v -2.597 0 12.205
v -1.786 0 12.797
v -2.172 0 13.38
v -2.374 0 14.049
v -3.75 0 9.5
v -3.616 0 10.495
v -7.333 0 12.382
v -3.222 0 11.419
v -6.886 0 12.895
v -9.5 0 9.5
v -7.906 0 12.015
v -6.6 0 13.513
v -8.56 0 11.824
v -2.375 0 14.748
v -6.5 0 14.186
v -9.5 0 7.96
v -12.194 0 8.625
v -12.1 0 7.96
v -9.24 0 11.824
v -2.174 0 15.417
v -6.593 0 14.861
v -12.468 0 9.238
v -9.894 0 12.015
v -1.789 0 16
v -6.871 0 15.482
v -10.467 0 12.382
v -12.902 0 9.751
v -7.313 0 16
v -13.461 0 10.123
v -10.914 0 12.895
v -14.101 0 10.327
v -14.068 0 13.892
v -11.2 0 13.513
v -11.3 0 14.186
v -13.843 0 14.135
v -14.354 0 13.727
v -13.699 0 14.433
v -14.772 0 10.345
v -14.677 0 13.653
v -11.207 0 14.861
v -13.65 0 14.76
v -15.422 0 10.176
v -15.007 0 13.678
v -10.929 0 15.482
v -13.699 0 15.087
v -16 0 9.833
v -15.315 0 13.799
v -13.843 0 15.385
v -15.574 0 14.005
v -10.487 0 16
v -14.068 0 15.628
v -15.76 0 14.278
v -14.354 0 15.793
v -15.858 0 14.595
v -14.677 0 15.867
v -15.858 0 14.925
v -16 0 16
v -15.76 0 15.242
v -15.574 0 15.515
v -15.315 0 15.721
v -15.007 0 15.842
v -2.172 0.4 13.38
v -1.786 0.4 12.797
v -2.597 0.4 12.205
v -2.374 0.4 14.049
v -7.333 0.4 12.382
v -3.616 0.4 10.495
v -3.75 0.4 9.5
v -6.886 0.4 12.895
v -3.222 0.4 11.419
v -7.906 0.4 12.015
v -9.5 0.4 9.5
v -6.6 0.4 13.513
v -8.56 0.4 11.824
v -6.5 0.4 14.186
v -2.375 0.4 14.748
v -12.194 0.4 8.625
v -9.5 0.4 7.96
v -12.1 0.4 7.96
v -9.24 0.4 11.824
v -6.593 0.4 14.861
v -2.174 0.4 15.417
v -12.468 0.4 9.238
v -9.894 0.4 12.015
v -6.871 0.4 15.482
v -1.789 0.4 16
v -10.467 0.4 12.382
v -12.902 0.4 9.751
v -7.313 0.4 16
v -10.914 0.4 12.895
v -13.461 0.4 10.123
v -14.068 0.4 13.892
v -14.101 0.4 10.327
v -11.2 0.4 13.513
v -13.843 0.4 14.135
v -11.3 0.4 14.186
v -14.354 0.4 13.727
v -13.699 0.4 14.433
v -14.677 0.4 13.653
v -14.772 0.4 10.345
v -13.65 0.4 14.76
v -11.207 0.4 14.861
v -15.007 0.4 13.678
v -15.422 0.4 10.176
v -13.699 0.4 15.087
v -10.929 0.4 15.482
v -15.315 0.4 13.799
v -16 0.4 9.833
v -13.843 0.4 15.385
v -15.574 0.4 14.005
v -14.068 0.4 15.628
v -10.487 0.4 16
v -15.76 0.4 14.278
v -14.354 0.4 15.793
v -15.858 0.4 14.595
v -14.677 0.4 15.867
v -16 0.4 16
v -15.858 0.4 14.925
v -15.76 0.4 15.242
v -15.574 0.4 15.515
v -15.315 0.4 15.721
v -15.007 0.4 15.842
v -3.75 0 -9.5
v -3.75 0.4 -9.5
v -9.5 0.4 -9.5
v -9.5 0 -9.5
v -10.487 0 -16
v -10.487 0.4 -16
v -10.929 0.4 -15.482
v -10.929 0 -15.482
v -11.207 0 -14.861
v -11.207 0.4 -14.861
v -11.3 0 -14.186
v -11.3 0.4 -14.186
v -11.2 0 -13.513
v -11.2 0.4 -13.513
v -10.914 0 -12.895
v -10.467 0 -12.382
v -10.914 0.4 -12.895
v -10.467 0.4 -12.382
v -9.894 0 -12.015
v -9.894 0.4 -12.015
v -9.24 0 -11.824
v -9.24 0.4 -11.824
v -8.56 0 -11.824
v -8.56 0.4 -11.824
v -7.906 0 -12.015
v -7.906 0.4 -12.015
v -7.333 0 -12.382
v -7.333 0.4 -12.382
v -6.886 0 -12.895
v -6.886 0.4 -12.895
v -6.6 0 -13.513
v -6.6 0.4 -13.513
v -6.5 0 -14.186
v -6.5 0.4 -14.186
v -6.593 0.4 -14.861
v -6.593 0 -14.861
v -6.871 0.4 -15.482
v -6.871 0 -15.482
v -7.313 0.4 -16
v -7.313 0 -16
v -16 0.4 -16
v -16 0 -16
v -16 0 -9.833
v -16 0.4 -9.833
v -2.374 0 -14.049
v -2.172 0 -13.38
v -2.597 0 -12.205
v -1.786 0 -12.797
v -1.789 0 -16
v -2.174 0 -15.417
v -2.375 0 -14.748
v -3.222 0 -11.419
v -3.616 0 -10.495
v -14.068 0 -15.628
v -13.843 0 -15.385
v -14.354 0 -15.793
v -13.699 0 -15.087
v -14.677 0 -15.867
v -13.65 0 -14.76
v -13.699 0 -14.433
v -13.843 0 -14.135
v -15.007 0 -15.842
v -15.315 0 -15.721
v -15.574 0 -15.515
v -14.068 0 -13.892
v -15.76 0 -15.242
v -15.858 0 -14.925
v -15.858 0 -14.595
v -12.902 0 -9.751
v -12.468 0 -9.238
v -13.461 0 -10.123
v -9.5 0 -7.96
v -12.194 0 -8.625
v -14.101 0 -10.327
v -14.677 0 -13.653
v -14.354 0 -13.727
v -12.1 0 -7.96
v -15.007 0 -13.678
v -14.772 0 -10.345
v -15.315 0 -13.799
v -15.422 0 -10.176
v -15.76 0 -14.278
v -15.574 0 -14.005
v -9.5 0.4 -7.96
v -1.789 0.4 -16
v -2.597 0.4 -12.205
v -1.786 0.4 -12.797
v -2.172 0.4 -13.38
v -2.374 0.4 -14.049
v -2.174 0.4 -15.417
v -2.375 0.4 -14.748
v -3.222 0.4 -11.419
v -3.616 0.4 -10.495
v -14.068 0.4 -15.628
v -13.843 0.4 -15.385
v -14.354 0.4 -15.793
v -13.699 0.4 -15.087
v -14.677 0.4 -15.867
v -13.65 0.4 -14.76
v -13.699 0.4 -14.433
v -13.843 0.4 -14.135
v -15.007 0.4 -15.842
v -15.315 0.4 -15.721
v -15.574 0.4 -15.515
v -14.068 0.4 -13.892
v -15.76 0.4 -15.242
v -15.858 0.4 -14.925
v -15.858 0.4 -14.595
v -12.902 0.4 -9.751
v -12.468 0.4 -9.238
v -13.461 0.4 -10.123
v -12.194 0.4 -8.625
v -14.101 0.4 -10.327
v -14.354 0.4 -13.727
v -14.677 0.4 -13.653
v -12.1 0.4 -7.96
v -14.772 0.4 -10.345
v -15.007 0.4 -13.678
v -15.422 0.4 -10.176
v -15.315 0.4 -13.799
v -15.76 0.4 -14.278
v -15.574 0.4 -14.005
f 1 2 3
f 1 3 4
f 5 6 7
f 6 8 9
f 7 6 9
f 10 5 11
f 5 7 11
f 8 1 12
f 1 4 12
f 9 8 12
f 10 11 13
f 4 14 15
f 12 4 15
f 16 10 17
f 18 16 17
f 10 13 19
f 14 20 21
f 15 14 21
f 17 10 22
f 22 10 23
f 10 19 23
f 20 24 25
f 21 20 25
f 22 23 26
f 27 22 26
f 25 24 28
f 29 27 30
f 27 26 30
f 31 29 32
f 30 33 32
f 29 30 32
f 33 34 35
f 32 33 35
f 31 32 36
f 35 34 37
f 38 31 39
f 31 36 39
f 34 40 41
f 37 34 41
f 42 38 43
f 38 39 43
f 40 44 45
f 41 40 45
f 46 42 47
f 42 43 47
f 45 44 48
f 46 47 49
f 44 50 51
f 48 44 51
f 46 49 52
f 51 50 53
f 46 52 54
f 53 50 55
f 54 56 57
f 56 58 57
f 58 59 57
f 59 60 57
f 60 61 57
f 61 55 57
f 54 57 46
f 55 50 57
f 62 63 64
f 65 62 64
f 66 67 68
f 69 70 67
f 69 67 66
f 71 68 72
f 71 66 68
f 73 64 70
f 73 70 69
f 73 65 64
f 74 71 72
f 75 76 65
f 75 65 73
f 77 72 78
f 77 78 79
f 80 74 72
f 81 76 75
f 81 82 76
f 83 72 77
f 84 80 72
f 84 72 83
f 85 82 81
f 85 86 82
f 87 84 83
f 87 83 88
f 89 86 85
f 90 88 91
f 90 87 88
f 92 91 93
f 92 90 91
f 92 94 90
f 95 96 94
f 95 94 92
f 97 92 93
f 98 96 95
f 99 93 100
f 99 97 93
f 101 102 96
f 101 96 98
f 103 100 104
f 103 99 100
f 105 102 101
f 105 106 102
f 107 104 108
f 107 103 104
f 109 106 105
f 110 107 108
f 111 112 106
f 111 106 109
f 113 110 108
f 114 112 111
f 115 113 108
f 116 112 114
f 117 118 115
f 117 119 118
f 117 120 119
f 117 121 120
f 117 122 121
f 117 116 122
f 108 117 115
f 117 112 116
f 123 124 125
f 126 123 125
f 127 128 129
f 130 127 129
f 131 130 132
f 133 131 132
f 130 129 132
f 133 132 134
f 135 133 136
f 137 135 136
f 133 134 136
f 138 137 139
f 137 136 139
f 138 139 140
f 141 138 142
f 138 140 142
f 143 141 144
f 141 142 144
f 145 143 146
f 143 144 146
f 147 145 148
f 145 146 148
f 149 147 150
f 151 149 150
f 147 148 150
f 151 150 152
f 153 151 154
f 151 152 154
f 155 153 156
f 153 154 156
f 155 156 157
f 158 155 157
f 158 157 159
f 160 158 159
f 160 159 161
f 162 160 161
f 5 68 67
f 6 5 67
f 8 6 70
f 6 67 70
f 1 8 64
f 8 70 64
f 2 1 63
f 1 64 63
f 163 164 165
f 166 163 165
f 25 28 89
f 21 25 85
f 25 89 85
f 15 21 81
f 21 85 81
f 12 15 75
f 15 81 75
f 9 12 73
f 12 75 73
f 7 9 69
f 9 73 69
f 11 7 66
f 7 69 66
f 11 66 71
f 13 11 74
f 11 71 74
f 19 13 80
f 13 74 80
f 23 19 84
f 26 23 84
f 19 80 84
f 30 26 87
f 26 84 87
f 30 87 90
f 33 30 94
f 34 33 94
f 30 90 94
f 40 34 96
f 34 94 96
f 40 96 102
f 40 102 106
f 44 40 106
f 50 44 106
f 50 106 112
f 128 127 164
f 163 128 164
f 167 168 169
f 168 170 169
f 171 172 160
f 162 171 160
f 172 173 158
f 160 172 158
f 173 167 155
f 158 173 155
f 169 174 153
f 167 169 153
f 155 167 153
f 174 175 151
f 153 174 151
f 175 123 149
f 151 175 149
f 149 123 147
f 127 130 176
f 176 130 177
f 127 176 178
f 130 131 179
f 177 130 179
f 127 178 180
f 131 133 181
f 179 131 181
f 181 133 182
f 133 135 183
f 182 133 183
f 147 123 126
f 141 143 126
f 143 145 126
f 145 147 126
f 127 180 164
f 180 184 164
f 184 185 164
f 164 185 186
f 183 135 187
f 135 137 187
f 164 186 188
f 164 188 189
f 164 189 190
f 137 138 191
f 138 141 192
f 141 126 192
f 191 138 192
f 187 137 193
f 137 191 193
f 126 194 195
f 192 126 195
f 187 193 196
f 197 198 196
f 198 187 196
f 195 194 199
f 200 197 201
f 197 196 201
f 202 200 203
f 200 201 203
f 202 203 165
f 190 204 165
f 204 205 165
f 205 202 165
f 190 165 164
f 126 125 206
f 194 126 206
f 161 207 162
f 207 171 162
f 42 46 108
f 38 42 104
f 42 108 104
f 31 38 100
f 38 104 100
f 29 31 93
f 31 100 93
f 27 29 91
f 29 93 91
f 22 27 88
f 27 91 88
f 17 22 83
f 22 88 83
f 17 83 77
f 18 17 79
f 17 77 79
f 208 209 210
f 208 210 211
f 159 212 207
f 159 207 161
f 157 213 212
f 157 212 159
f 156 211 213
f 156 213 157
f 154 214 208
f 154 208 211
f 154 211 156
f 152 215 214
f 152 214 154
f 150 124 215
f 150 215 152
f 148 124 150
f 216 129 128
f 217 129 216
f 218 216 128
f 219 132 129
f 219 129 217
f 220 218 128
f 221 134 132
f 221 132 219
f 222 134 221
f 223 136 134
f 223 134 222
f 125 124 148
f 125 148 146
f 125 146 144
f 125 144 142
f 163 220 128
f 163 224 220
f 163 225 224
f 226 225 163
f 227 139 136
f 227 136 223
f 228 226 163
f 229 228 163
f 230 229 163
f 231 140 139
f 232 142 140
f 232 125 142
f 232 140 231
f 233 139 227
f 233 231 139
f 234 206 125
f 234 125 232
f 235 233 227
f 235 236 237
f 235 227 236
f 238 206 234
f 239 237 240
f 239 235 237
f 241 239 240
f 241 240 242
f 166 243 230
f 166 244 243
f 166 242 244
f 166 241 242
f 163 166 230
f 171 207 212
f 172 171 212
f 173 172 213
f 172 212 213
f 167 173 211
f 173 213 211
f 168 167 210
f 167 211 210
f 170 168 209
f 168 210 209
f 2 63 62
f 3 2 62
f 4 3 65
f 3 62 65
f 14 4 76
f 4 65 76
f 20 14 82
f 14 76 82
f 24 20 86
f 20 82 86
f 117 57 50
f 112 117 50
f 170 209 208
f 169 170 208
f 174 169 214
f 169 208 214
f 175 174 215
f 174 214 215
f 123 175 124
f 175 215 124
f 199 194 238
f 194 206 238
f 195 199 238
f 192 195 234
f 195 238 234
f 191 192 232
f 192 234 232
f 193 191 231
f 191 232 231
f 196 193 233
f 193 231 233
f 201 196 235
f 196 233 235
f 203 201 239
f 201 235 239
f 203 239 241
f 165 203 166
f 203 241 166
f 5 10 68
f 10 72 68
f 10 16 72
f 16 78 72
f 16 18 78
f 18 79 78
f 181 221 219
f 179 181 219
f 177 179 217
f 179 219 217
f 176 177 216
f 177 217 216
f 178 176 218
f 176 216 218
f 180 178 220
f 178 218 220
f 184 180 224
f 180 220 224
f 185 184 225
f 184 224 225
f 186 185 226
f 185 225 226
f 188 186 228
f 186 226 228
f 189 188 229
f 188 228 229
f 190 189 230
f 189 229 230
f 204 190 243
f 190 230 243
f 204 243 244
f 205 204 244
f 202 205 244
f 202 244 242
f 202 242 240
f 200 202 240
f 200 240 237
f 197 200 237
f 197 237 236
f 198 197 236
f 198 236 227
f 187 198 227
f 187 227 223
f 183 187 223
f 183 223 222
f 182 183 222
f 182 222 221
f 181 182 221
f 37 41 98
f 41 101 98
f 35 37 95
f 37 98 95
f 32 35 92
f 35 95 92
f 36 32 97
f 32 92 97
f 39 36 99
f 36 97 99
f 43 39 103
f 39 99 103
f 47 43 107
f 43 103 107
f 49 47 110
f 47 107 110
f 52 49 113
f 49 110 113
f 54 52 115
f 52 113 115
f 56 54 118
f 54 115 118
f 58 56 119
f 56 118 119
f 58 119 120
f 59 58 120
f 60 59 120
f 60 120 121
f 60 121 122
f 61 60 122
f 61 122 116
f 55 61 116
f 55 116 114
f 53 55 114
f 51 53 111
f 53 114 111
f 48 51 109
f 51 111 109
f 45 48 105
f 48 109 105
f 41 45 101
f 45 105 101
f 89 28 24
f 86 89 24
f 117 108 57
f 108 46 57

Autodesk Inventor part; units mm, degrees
ref_plane "YZ Plane" through (0, 0, 0) normal (1, 0, 0) x (0, 1, 0)
ref_plane "XZ Plane" through (0, 0, 0) normal (0, 1, 0) x (-1, 0, 0)
ref_plane "XY Plane" through (0, 0, 0) normal (0, 0, 1) x (1, 0, 0)
sketch "Sketch1" plane through (0, 0, 0) normal (0, 1, 0) x (-1, 0, 0)
  line L0 (16, 16) -> (-16, 16)
  line L1 (-16, 16) -> (-16, -16)
  line L2 (-16, -16) -> (16, -16)
  line L3 (16, -16) -> (16, 16)
  line L4 (16, 16) -> (-16, -16) construction
  line L5 (-16, 16) -> (16, -16) construction
  point P0 (0, 0)
  dimension "d0" = 32
  dimension "d1" = 32
extrude "Extrusion1" add sketch "Sketch1" along normal blind 0.4
sketch "Sketch2" plane through (0, 0.4, 0) normal (0, 1, 0) x (1, 0, 0)
  line L0 (-9.5, -9.5) -> (9.5, -9.5)
  line L1 (9.5, -9.5) -> (9.5, 9.5)
  line L2 (9.5, 9.5) -> (-9.5, 9.5)
  line L3 (-9.5, 9.5) -> (-9.5, -9.5)
  line L4 (-9.5, -9.5) -> (9.5, 9.5) construction
  line L5 (9.5, -9.5) -> (-9.5, 9.5) construction
  circle A0 centre (0, 9.5) radius 3.75
  circle A1 centre (0, -9.5) radius 3.75
  point P0 (0, 0)
  point P1 (-3.75, -9.5)
  point P2 (3.75, -9.5)
  point P3 (3.75, 9.5)
  point P4 (-3.75, 9.5)
  dimension "d4" = 19
  dimension "d5" = 19
  dimension "d6" = 7.5
  dimension "d7" = 7.5
extrude "Extrusion2" cut sketch "Sketch2" against normal blind 0.4
sketch "Sketch3" plane through (0, 0.4, 0) normal (0, 1, 0) x (1, 0, 0)
  line L0 (-16, -16) -> (16, -16) projected
  line L1 (16, 16) -> (-16, 16) projected
  line L2 (0, -16) -> (16, -16)
  line L3 (16, -16) -> (16, 16)
  line L4 (16, 16) -> (0, 16)
  line L5 (0, 16) -> (0, -16)
  point P0 (0, 0)
extrude "Extrusion3" cut sketch "Sketch3" against normal blind 0.4
sketch "Sketch4" plane through (0, 0.4, 0) normal (0, 1, 0) x (1, 0, 0)
  circle A0 centre (-14.76, -14.76) radius 1.11
  circle A1 centre (-14.76, 14.76) radius 1.11
  line L0 (-16, 16) -> (-16, -16) projected
  line L1 (-16, -16) -> (0, -16) projected
  line L2 (0, 16) -> (-16, 16) projected
  circle A2 centre (0, -14.4) radius 2.4
  circle A3 centre (-14.5, 7.96) radius 2.4
  circle A4 centre (-14.5, -7.96) radius 2.4
  circle A5 centre (-8.9, -14.2) radius 2.4
  circle A6 centre (-8.9, 14.2) radius 2.4
  circle A7 centre (0, 14.4) radius 2.4
  line L3 (0, -16) -> (0, -13.25) projected
  line L4 (0, 13.25) -> (0, 16) projected
  point P0 (0, 0)
  point P1 (-7.3125, -16)
  point P2 (-10.4875, -16)
  point P3 (-10.4875, 16)
  point P4 (-7.3125, 16)
  point P5 (-16, -6.0865)
  point P6 (-16, -9.8335)
  point P7 (-16, 9.8335)
  point P8 (-16, 6.0865)
  dimension "d12" = 2.22
  dimension "d13" = 2.22
  dimension "d14" = 1.24
  dimension "d15" = 1.24
  dimension "d16" = 1.24
  dimension "d17" = 1.24
  dimension "d18" = 4.8
  dimension "d19" = 4.8
  dimension "d20" = 4.8
  dimension "d21" = 4.8
  dimension "d22" = 4.8
  dimension "d23" = 4.8
  dimension "d24" = 0
  dimension "d26" = 0
  dimension "d28" = 7.1
  dimension "d29" = 1.8
  dimension "d30" = 1.8
  dimension "d31" = 7.1
  dimension "d32" = 1.6
  dimension "d33" = 1.6
  dimension "d34" = 1.5
  dimension "d35" = 8.04
  dimension "d36" = 8.04
  dimension "d37" = 1.5
extrude "Extrusion4" cut sketch "Sketch4" against normal blind 0.4 contours A0 | A1 | A2 | A5 L1 | A4 L0 | A3 L0 | A7 | L2 A6 picked at (-8.777, -14.4925) picked at (-14.5551, -7.8666) picked at (-14.7976, 7.5771) picked at (-8.6453, 14.6416)
sketch "Sketch5" plane through (0, 0.4, 0) normal (0, 1, 0) x (1, 0, 0)
  line L0 (-9.5, -9.5) -> (-9.5, 9.5) projected
  line L1 (-16, -7.96) -> (-9.5, -7.96)
  line L2 (-9.5, -7.96) -> (-9.5, 7.96)
  line L3 (-9.5, 7.96) -> (-16, 7.96)
  line L4 (-16, 7.96) -> (-16, -7.96)
  point P0 (0, 0)
  dimension "d40" = 15.92
extrude "Extrusion5" cut sketch "Sketch5" against normal blind 0.4
properties part number "Top Cover Other Side"
